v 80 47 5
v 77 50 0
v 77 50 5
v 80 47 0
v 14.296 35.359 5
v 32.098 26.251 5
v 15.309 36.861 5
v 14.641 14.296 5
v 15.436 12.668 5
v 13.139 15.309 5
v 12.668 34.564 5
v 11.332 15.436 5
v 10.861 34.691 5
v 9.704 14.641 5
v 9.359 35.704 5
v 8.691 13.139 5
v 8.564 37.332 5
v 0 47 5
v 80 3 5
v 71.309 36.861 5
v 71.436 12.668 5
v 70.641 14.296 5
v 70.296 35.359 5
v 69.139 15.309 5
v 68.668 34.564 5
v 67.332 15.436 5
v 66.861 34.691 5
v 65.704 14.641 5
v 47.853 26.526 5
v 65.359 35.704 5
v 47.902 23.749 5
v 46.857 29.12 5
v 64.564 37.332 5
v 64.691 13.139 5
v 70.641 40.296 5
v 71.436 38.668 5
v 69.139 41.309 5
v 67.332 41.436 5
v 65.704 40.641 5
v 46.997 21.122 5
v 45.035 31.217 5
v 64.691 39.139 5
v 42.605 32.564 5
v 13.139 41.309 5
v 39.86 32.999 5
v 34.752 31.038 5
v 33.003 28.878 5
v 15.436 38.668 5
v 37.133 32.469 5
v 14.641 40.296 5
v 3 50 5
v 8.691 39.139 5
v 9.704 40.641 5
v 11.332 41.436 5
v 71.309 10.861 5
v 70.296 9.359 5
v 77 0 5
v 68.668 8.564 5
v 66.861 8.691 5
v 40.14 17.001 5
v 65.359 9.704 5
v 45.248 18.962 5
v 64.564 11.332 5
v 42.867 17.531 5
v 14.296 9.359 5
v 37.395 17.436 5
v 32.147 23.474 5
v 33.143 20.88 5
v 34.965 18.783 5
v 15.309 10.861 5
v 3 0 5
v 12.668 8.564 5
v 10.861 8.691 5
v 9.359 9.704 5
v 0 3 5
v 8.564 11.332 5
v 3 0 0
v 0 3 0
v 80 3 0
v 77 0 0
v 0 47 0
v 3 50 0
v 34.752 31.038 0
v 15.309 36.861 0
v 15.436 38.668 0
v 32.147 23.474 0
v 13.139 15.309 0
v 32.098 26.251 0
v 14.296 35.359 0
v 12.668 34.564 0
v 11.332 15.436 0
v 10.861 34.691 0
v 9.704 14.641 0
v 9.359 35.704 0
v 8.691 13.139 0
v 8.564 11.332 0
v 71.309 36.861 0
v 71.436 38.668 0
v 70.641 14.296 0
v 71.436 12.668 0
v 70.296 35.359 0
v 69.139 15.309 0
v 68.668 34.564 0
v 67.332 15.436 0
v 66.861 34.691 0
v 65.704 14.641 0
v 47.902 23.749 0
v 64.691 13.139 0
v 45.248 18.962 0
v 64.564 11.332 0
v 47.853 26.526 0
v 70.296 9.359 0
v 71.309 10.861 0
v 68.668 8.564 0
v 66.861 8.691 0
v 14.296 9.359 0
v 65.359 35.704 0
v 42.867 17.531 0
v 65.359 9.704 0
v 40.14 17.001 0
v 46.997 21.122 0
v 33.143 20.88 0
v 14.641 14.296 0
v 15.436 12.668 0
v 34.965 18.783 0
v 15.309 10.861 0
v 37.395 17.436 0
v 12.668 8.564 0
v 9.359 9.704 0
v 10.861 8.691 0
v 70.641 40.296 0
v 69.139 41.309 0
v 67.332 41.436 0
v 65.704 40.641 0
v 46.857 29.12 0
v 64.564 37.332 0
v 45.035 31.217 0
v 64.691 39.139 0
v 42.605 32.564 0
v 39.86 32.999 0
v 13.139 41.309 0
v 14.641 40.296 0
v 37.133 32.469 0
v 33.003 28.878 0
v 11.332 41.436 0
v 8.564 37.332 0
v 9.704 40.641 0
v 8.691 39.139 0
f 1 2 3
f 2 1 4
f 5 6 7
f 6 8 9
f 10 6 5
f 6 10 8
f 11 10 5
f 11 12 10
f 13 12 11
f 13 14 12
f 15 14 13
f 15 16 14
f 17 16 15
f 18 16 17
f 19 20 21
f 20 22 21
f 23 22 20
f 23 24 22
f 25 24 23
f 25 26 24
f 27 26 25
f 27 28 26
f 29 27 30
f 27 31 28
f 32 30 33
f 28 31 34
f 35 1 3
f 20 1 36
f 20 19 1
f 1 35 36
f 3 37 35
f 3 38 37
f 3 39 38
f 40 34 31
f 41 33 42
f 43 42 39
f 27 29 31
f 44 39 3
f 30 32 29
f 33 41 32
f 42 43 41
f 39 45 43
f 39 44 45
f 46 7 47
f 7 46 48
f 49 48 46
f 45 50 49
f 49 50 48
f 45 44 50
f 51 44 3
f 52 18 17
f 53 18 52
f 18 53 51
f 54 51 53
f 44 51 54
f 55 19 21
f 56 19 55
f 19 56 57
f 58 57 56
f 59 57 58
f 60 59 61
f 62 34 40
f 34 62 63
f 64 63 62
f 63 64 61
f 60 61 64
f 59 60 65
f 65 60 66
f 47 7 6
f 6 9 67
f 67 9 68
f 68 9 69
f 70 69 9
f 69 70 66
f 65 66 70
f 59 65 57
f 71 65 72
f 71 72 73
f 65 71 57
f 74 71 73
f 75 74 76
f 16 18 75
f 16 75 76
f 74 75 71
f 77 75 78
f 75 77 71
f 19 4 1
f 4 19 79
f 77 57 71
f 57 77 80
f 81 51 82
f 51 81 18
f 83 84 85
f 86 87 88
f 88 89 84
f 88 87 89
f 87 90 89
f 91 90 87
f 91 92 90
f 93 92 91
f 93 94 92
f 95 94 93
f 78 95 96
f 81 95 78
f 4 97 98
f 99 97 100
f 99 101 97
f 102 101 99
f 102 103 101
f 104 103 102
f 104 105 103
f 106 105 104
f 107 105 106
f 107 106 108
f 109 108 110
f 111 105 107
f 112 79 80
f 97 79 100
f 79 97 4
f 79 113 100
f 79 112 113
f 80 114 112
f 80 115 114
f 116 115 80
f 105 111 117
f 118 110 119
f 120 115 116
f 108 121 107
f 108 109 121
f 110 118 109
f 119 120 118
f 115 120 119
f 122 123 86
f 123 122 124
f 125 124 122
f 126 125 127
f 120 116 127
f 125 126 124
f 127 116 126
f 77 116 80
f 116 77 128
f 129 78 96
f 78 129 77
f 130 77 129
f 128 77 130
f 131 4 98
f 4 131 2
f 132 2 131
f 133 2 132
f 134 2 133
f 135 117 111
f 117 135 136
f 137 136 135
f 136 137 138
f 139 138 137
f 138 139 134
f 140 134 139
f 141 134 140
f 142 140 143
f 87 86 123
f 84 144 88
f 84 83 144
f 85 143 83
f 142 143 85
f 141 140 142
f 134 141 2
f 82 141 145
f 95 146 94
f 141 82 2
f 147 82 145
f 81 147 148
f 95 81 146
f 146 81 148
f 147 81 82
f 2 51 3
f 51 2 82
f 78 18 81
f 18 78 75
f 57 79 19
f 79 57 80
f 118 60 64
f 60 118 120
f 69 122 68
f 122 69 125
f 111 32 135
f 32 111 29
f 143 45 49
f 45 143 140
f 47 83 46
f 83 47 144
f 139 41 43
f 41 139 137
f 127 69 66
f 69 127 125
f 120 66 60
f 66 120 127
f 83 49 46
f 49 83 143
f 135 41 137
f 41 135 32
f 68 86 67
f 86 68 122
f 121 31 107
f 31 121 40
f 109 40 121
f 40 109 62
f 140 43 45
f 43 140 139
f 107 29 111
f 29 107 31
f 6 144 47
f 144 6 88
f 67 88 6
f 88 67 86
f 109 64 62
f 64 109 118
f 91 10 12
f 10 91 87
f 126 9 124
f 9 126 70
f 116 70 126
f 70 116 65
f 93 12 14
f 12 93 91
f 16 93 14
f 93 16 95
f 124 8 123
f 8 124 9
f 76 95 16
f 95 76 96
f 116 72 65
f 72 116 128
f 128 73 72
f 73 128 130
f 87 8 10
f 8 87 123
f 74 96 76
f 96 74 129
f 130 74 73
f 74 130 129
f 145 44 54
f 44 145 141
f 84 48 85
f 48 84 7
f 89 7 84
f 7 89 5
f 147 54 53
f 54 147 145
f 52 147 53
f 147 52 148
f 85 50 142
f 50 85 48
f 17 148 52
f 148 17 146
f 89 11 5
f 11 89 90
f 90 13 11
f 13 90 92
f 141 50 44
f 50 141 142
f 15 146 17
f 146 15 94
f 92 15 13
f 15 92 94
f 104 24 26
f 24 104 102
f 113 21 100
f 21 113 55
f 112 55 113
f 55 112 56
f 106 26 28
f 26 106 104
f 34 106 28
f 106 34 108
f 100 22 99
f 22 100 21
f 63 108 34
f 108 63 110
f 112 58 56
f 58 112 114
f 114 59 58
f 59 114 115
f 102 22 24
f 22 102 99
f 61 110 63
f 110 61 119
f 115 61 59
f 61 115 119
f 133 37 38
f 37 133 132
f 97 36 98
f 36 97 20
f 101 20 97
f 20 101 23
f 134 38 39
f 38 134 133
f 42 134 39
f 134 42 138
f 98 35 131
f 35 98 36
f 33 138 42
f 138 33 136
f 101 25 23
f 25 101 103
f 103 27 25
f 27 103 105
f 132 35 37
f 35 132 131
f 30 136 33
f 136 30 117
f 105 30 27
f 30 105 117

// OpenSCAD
$fn = 32;

// ----------------------------------------------------------------------
// Spacer plate: rect 80 x 50
// ----------------------------------------------------------------------

// --- parameters (mm) ---
bore_r = 8;               // centre bore radius
bolt_r = 3.5;             // bolt hole radius
plate_t = 5;              // plate thickness, Z (extrusion height)
plate_l = 80;             // plate length, X
plate_w = 50;             // plate width, Y
inset = 12;               // corner hole inset

profile = [[3, 0], [77, 0], [80, 3], [80, 47], [77, 50], [3, 50], [0, 47], [0, 3]];  // primary outline, 8 points, counter clockwise
void_1 = [[47.853, 26.526], [46.857, 29.12], [45.035, 31.217], [42.605, 32.564], [39.86, 32.999], [37.133, 32.469], [34.752, 31.038], [33.003, 28.878], [32.098, 26.251], [32.147, 23.474], [33.143, 20.88], [34.965, 18.783], [37.395, 17.436], [40.14, 17.001], [42.867, 17.531], [45.248, 18.962], [46.997, 21.122], [47.902, 23.749]];  // centre bore, 18 points
void_2 = [[15.436, 12.668], [14.641, 14.296], [13.139, 15.309], [11.332, 15.436], [9.704, 14.641], [8.691, 13.139], [8.564, 11.332], [9.359, 9.704], [10.861, 8.691], [12.668, 8.564], [14.296, 9.359], [15.309, 10.861]];  // corner hole, 12 points
void_3 = [[15.436, 38.668], [14.641, 40.296], [13.139, 41.309], [11.332, 41.436], [9.704, 40.641], [8.691, 39.139], [8.564, 37.332], [9.359, 35.704], [10.861, 34.691], [12.668, 34.564], [14.296, 35.359], [15.309, 36.861]];  // corner hole, 12 points
void_4 = [[71.436, 12.668], [70.641, 14.296], [69.139, 15.309], [67.332, 15.436], [65.704, 14.641], [64.691, 13.139], [64.564, 11.332], [65.359, 9.704], [66.861, 8.691], [68.668, 8.564], [70.296, 9.359], [71.309, 10.861]];  // corner hole, 12 points
void_5 = [[71.436, 38.668], [70.641, 40.296], [69.139, 41.309], [67.332, 41.436], [65.704, 40.641], [64.691, 39.139], [64.564, 37.332], [65.359, 35.704], [66.861, 34.691], [68.668, 34.564], [70.296, 35.359], [71.309, 36.861]];  // corner hole, 12 points

// --- the one profile operation ---
difference() {
  linear_extrude(height = plate_t) polygon(points = profile);
  translate([0, 0, -1])
    linear_extrude(height = plate_t + 2) polygon(points = void_1);
  translate([0, 0, -1])
    linear_extrude(height = plate_t + 2) polygon(points = void_2);
  translate([0, 0, -1])
    linear_extrude(height = plate_t + 2) polygon(points = void_3);
  translate([0, 0, -1])
    linear_extrude(height = plate_t + 2) polygon(points = void_4);
  translate([0, 0, -1])
    linear_extrude(height = plate_t + 2) polygon(points = void_5);
}
